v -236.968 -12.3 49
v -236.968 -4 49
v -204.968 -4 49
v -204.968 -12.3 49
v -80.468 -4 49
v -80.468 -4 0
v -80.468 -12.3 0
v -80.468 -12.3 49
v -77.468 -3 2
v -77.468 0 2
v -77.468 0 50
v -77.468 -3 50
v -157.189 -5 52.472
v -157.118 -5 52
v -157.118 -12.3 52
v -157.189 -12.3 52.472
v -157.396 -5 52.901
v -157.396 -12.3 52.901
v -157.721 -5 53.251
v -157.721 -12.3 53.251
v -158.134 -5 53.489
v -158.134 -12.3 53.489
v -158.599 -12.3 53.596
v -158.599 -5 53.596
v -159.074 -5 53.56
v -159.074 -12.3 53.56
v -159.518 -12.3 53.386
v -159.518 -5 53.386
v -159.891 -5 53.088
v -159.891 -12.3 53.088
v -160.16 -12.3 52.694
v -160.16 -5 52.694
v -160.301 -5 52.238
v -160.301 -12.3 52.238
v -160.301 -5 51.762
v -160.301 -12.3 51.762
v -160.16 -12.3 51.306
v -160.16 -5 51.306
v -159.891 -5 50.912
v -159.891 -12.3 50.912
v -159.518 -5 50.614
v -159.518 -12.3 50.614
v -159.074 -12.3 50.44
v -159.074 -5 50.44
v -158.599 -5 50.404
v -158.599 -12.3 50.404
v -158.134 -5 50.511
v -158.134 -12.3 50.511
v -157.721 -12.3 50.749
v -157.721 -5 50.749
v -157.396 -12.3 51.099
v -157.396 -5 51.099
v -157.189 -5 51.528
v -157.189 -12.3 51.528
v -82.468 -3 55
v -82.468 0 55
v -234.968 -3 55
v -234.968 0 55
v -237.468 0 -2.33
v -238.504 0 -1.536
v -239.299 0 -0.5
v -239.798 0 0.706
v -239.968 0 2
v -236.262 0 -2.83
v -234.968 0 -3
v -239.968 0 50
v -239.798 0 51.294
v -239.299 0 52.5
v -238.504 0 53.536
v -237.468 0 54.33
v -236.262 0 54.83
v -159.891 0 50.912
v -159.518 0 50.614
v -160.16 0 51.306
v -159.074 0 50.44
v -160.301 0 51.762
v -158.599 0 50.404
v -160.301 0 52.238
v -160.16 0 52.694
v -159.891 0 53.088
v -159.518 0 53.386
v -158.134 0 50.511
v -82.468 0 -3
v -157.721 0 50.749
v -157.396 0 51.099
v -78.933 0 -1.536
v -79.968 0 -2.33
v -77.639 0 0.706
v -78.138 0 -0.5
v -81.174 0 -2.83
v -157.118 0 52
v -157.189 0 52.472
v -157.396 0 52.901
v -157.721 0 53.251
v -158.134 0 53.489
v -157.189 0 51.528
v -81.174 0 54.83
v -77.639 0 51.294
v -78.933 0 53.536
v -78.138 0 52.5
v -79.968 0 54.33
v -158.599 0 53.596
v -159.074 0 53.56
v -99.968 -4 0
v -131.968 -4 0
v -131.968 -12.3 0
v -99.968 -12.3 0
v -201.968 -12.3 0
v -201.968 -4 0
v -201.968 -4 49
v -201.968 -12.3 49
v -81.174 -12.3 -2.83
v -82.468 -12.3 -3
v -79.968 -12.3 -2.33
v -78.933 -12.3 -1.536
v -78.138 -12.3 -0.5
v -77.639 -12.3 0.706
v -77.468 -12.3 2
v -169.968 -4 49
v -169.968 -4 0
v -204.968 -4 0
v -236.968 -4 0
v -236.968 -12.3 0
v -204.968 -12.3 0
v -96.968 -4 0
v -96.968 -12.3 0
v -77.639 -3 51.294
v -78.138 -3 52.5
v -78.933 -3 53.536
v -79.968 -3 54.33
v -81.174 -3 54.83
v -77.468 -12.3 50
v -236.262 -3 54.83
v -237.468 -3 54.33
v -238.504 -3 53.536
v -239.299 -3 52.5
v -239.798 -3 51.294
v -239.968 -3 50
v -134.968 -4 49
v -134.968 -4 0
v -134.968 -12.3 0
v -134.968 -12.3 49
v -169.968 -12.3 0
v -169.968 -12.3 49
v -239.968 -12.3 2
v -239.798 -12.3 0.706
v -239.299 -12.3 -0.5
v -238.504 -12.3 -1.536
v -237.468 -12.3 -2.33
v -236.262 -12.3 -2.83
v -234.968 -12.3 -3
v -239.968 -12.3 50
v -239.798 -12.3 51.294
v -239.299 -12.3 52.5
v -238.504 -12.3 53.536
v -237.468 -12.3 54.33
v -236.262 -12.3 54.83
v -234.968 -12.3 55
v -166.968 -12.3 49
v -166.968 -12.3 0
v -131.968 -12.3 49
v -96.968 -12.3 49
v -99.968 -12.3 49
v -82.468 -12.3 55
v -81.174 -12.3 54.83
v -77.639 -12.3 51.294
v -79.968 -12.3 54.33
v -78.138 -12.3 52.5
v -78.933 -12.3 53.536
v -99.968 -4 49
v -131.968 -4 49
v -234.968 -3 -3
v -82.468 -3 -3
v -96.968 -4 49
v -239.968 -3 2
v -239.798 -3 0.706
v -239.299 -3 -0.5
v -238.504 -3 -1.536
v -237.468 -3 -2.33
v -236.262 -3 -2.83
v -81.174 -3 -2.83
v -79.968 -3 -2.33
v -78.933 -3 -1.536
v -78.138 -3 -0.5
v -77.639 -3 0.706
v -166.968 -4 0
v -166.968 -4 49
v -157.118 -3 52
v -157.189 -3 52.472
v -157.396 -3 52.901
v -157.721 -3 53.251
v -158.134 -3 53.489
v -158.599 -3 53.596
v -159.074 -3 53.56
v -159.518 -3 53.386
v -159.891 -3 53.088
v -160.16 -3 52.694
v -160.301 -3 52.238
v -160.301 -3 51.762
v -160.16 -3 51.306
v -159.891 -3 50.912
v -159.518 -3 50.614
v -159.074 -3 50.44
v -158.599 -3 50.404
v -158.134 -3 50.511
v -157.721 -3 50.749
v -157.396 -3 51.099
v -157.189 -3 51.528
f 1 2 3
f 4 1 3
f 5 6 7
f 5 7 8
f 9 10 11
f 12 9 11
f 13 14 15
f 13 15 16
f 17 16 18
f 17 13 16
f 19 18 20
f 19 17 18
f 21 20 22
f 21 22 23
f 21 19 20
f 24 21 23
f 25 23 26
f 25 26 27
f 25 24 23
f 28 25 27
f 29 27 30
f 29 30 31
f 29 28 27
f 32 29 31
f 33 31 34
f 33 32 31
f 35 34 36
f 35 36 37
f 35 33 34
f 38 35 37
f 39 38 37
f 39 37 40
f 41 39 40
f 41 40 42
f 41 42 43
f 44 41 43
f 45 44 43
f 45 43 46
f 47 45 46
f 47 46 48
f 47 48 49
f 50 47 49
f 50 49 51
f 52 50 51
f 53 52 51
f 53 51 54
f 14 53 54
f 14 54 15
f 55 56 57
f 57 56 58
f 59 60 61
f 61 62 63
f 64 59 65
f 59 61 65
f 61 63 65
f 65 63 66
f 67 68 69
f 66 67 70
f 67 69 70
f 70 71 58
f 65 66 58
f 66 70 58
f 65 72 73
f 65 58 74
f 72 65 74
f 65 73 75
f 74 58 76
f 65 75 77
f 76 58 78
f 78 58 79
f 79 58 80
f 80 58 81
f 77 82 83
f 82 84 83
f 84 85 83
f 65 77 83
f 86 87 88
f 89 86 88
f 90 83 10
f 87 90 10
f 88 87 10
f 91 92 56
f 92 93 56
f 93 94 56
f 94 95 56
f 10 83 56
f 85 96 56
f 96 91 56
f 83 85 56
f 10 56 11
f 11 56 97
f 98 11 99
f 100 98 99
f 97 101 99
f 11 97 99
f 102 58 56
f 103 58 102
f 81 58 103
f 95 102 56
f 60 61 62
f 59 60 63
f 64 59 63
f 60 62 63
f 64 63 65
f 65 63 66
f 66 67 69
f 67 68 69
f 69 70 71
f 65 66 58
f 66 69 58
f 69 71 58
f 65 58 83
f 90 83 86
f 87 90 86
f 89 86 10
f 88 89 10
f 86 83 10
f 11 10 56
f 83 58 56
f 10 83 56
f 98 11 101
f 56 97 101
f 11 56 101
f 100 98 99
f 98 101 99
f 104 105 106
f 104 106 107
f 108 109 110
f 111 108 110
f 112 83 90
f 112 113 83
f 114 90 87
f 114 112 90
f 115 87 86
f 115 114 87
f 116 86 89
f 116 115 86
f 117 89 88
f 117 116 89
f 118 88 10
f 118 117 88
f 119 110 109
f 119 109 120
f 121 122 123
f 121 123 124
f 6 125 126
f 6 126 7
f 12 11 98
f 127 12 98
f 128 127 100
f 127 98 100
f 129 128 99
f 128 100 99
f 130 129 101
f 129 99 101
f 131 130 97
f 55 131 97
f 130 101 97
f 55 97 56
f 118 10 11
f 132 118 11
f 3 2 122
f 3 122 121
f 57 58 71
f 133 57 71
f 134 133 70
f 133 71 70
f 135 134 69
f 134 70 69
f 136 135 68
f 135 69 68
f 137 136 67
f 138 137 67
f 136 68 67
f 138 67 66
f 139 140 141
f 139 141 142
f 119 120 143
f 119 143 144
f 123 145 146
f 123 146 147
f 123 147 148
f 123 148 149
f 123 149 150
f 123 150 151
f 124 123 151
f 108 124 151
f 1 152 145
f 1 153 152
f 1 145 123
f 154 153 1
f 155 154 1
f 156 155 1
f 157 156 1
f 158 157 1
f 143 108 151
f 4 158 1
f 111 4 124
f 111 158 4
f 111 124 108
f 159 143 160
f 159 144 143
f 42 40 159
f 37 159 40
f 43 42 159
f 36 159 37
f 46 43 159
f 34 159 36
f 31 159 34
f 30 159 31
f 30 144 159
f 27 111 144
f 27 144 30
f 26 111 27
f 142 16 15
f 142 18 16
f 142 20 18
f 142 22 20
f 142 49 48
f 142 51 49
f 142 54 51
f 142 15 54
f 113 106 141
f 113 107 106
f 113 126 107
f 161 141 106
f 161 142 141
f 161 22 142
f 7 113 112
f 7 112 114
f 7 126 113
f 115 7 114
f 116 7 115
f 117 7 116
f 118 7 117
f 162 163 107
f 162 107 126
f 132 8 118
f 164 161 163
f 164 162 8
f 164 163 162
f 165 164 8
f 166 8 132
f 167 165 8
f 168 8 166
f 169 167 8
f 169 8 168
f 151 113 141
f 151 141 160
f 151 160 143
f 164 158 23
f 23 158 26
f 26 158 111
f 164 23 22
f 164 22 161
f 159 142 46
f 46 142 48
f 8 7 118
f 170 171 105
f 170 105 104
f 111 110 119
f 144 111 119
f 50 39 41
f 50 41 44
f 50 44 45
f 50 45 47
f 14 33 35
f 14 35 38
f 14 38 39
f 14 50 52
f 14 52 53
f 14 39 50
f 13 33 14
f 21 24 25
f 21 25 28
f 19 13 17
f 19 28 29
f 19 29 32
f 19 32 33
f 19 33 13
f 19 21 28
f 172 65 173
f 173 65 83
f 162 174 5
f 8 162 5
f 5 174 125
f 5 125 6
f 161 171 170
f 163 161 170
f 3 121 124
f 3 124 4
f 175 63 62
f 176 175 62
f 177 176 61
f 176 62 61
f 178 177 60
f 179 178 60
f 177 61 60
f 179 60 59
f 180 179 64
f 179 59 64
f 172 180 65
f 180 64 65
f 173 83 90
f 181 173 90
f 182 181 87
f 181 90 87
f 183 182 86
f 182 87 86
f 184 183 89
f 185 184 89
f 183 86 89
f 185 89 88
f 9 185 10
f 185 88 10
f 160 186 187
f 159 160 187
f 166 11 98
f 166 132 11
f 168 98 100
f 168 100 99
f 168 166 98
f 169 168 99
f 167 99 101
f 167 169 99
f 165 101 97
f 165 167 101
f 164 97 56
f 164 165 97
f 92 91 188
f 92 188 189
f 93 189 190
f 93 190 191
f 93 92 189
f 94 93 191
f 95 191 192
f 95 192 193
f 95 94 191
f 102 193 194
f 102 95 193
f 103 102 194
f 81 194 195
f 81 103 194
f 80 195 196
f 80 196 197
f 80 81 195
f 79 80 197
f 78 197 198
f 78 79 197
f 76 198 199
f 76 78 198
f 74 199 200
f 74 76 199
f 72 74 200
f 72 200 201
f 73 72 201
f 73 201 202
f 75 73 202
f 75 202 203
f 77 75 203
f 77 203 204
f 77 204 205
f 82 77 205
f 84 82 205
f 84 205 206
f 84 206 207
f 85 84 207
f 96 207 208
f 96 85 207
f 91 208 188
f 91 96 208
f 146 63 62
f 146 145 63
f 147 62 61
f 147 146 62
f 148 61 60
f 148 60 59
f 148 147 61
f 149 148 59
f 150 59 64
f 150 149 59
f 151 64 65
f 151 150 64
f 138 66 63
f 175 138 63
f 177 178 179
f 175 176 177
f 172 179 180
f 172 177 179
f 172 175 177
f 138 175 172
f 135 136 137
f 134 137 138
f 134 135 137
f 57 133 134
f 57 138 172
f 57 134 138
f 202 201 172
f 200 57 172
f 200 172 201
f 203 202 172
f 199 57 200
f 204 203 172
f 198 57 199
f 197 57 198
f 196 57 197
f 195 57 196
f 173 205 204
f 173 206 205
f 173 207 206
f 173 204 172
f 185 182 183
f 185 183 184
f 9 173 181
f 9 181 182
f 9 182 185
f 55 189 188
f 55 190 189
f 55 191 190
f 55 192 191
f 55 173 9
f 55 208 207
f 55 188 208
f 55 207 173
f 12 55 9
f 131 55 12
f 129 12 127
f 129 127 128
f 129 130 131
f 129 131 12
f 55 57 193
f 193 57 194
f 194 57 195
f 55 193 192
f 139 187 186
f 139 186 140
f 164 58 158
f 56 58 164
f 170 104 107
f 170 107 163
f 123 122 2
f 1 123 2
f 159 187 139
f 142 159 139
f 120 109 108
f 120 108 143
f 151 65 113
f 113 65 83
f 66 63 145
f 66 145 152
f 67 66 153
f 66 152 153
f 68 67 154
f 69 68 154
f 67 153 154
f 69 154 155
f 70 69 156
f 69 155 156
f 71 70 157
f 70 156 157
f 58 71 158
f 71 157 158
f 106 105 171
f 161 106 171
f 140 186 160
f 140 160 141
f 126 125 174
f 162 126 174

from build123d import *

# Parameters (mm, degrees)
F0_W     = 162.5
F0_H     = 58
F0_W_2   = 32
F0_H_2   = 49
F0_W_3   = 16.5
F0_R     = 1.6
F1_DEPTH = 12.3
F2_DEPTH = 4
F3_DEPTH = 5
F4_R     = 5
F5_R     = 1.6
F6_DEPTH = 3


with BuildPart() as f1:
    # F0 (on Front) → F1 (new body)
    with BuildSketch(Plane.XZ):
        with Locations((-158.718385, 26)):
            Rectangle(F0_W, F0_H)
        with Locations((-220.968385, 24.5)):
            Rectangle(F0_W_2, F0_H_2, mode=Mode.SUBTRACT)
        with Locations((-185.968385, 24.5)):
            Rectangle(F0_W_2, F0_H_2, mode=Mode.SUBTRACT)
        with Locations((-150.968385, 24.5)):
            Rectangle(F0_W_2, F0_H_2, mode=Mode.SUBTRACT)
        with Locations((-115.968385, 24.5)):
            Rectangle(F0_W_2, F0_H_2, mode=Mode.SUBTRACT)
        with Locations((-88.718385, 24.5)):
            Rectangle(F0_W_3, F0_H_2, mode=Mode.SUBTRACT)
        with Locations((-158.718385, 52)):
            Circle(F0_R, mode=Mode.SUBTRACT)
    extrude(amount=F1_DEPTH)

    # F0 (on Front) → F2 (join)
    with BuildSketch(Plane.XZ):
        with Locations((-220.968385, 24.5)):
            Rectangle(F0_W_2, F0_H_2)
        with Locations((-185.968385, 24.5)):
            Rectangle(F0_W_2, F0_H_2)
        with Locations((-150.968385, 24.5)):
            Rectangle(F0_W_2, F0_H_2)
        with Locations((-115.968385, 24.5)):
            Rectangle(F0_W_2, F0_H_2)
        with Locations((-88.718385, 24.5)):
            Rectangle(F0_W_3, F0_H_2)
    extrude(amount=F2_DEPTH)

    # F0 (on Front) → F3 (join)
    with BuildSketch(Plane.XZ):
        with Locations((-158.718385, 52)):
            Circle(F0_R)
    extrude(amount=F3_DEPTH)

    # F4
    f4_edges = [f1.edges().sort_by_distance(p)[0] for p in [
        (-77.468385, -6.15, -3),
        (-77.468385, -6.15, 55),
        (-239.968385, -6.15, -3),
        (-239.968385, -6.15, 55),
    ]]
    fillet(f4_edges, radius=F4_R)


with BuildPart() as f6:
    # F5 (on Front) → F6 (new body)
    with BuildSketch(Plane.XZ):
        with BuildLine():
            Line((-82.468385, 55), (-234.968385, 55))
            ThreePointArc((-234.968385, 55), (-238.503919, 53.535534), (-239.968385, 50))
            Line((-239.968385, 50), (-239.968385, 2))
            ThreePointArc((-239.968385, 2), (-238.503919, -1.535534), (-234.968385, -3))
            Line((-234.968385, -3), (-82.468385, -3))
            ThreePointArc((-82.468385, -3), (-78.932851, -1.535534), (-77.468385, 2))
            Line((-77.468385, 2), (-77.468385, 50))
            ThreePointArc((-77.468385, 50), (-78.932851, 53.535534), (-82.468385, 55))
        make_face()
        with Locations((-158.718385, 52)):
            Circle(F5_R, mode=Mode.SUBTRACT)
    extrude(amount=F6_DEPTH)


solid = Compound([f1.part, f6.part])
